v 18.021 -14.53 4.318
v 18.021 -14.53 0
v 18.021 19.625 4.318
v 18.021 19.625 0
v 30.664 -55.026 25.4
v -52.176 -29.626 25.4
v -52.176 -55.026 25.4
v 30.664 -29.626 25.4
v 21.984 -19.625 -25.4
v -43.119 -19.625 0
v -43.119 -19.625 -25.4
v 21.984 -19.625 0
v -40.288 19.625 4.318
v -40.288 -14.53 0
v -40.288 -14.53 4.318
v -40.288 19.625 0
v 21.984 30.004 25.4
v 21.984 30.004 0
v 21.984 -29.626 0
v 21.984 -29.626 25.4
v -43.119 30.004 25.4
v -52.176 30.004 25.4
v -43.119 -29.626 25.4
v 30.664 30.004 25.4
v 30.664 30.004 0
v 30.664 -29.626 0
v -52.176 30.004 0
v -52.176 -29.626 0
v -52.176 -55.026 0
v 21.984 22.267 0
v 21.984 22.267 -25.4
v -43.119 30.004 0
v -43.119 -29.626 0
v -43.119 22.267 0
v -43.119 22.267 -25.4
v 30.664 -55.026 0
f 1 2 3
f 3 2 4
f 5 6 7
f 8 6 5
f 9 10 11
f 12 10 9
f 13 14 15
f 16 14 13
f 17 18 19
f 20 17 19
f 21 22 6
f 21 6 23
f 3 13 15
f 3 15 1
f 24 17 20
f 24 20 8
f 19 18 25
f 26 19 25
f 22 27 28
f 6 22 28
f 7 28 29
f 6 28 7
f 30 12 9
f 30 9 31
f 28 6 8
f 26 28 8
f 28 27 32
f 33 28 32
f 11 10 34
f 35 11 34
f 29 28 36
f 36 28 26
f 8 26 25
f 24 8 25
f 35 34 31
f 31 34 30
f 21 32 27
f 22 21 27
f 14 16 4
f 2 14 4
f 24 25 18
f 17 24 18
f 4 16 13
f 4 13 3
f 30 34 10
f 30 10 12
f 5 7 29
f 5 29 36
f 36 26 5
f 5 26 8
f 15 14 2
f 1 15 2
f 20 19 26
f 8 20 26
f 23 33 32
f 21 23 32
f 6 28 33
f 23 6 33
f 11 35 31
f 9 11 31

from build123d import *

# Parameters (mm, degrees)
F1_DEPTH = 25.4
F0_W     = 65.102479
F0_H     = 41.892032
F0_W_2   = 58.309173
F0_H_2   = 34.155215
F2_DEPTH = 25.4
F3_DEPTH = 4.318
F4_W     = 82.840543
F4_H     = 25.4
F5_DEPTH = 25.4


with BuildPart() as f1:
    # F0 (on Top) → F1 (new body)
    with BuildSketch(Plane.XY):
        Polygon((-43.1186, 30.003751), (-52.176334, 30.003751), (-52.176334, -29.626343), (-43.1186, -29.626343), (-43.1186, -19.625096), (-43.1186, 22.266936), align=None)
        Polygon((21.983879, 30.003751), (21.983879, 22.266936), (21.983879, -19.625096), (21.983879, -29.626343), (30.664209, -29.626343), (30.664209, 30.003751), align=None)
    extrude(amount=F1_DEPTH)


with BuildPart() as f2:
    # F0 (on Top) → F2 (new body)
    with BuildSketch(Plane.XY):
        with Locations((-10.567361, 1.32092)):
            Rectangle(F0_W, F0_H)
        with Locations((-11.133466, 2.547489)):
            Rectangle(F0_W_2, F0_H_2, mode=Mode.SUBTRACT)
        with Locations((-11.133466, 2.547489)):
            Rectangle(F0_W_2, F0_H_2)
    extrude(amount=-F2_DEPTH)


with BuildPart() as f3:
    # F0 (on Top) → F3 (new body)
    with BuildSketch(Plane.XY):
        with Locations((-11.133466, 2.547489)):
            Rectangle(F0_W_2, F0_H_2)
    extrude(amount=F3_DEPTH)


with BuildPart() as f5:
    # F4 (on face) → F5 (new body)
    with BuildSketch(Plane.XZ.offset(29.626343)):
        with Locations((-10.756062, 12.7)):
            Rectangle(F4_W, F4_H)
    extrude(amount=F5_DEPTH)


solid = Compound([f1.part, f2.part, f3.part, f5.part])
